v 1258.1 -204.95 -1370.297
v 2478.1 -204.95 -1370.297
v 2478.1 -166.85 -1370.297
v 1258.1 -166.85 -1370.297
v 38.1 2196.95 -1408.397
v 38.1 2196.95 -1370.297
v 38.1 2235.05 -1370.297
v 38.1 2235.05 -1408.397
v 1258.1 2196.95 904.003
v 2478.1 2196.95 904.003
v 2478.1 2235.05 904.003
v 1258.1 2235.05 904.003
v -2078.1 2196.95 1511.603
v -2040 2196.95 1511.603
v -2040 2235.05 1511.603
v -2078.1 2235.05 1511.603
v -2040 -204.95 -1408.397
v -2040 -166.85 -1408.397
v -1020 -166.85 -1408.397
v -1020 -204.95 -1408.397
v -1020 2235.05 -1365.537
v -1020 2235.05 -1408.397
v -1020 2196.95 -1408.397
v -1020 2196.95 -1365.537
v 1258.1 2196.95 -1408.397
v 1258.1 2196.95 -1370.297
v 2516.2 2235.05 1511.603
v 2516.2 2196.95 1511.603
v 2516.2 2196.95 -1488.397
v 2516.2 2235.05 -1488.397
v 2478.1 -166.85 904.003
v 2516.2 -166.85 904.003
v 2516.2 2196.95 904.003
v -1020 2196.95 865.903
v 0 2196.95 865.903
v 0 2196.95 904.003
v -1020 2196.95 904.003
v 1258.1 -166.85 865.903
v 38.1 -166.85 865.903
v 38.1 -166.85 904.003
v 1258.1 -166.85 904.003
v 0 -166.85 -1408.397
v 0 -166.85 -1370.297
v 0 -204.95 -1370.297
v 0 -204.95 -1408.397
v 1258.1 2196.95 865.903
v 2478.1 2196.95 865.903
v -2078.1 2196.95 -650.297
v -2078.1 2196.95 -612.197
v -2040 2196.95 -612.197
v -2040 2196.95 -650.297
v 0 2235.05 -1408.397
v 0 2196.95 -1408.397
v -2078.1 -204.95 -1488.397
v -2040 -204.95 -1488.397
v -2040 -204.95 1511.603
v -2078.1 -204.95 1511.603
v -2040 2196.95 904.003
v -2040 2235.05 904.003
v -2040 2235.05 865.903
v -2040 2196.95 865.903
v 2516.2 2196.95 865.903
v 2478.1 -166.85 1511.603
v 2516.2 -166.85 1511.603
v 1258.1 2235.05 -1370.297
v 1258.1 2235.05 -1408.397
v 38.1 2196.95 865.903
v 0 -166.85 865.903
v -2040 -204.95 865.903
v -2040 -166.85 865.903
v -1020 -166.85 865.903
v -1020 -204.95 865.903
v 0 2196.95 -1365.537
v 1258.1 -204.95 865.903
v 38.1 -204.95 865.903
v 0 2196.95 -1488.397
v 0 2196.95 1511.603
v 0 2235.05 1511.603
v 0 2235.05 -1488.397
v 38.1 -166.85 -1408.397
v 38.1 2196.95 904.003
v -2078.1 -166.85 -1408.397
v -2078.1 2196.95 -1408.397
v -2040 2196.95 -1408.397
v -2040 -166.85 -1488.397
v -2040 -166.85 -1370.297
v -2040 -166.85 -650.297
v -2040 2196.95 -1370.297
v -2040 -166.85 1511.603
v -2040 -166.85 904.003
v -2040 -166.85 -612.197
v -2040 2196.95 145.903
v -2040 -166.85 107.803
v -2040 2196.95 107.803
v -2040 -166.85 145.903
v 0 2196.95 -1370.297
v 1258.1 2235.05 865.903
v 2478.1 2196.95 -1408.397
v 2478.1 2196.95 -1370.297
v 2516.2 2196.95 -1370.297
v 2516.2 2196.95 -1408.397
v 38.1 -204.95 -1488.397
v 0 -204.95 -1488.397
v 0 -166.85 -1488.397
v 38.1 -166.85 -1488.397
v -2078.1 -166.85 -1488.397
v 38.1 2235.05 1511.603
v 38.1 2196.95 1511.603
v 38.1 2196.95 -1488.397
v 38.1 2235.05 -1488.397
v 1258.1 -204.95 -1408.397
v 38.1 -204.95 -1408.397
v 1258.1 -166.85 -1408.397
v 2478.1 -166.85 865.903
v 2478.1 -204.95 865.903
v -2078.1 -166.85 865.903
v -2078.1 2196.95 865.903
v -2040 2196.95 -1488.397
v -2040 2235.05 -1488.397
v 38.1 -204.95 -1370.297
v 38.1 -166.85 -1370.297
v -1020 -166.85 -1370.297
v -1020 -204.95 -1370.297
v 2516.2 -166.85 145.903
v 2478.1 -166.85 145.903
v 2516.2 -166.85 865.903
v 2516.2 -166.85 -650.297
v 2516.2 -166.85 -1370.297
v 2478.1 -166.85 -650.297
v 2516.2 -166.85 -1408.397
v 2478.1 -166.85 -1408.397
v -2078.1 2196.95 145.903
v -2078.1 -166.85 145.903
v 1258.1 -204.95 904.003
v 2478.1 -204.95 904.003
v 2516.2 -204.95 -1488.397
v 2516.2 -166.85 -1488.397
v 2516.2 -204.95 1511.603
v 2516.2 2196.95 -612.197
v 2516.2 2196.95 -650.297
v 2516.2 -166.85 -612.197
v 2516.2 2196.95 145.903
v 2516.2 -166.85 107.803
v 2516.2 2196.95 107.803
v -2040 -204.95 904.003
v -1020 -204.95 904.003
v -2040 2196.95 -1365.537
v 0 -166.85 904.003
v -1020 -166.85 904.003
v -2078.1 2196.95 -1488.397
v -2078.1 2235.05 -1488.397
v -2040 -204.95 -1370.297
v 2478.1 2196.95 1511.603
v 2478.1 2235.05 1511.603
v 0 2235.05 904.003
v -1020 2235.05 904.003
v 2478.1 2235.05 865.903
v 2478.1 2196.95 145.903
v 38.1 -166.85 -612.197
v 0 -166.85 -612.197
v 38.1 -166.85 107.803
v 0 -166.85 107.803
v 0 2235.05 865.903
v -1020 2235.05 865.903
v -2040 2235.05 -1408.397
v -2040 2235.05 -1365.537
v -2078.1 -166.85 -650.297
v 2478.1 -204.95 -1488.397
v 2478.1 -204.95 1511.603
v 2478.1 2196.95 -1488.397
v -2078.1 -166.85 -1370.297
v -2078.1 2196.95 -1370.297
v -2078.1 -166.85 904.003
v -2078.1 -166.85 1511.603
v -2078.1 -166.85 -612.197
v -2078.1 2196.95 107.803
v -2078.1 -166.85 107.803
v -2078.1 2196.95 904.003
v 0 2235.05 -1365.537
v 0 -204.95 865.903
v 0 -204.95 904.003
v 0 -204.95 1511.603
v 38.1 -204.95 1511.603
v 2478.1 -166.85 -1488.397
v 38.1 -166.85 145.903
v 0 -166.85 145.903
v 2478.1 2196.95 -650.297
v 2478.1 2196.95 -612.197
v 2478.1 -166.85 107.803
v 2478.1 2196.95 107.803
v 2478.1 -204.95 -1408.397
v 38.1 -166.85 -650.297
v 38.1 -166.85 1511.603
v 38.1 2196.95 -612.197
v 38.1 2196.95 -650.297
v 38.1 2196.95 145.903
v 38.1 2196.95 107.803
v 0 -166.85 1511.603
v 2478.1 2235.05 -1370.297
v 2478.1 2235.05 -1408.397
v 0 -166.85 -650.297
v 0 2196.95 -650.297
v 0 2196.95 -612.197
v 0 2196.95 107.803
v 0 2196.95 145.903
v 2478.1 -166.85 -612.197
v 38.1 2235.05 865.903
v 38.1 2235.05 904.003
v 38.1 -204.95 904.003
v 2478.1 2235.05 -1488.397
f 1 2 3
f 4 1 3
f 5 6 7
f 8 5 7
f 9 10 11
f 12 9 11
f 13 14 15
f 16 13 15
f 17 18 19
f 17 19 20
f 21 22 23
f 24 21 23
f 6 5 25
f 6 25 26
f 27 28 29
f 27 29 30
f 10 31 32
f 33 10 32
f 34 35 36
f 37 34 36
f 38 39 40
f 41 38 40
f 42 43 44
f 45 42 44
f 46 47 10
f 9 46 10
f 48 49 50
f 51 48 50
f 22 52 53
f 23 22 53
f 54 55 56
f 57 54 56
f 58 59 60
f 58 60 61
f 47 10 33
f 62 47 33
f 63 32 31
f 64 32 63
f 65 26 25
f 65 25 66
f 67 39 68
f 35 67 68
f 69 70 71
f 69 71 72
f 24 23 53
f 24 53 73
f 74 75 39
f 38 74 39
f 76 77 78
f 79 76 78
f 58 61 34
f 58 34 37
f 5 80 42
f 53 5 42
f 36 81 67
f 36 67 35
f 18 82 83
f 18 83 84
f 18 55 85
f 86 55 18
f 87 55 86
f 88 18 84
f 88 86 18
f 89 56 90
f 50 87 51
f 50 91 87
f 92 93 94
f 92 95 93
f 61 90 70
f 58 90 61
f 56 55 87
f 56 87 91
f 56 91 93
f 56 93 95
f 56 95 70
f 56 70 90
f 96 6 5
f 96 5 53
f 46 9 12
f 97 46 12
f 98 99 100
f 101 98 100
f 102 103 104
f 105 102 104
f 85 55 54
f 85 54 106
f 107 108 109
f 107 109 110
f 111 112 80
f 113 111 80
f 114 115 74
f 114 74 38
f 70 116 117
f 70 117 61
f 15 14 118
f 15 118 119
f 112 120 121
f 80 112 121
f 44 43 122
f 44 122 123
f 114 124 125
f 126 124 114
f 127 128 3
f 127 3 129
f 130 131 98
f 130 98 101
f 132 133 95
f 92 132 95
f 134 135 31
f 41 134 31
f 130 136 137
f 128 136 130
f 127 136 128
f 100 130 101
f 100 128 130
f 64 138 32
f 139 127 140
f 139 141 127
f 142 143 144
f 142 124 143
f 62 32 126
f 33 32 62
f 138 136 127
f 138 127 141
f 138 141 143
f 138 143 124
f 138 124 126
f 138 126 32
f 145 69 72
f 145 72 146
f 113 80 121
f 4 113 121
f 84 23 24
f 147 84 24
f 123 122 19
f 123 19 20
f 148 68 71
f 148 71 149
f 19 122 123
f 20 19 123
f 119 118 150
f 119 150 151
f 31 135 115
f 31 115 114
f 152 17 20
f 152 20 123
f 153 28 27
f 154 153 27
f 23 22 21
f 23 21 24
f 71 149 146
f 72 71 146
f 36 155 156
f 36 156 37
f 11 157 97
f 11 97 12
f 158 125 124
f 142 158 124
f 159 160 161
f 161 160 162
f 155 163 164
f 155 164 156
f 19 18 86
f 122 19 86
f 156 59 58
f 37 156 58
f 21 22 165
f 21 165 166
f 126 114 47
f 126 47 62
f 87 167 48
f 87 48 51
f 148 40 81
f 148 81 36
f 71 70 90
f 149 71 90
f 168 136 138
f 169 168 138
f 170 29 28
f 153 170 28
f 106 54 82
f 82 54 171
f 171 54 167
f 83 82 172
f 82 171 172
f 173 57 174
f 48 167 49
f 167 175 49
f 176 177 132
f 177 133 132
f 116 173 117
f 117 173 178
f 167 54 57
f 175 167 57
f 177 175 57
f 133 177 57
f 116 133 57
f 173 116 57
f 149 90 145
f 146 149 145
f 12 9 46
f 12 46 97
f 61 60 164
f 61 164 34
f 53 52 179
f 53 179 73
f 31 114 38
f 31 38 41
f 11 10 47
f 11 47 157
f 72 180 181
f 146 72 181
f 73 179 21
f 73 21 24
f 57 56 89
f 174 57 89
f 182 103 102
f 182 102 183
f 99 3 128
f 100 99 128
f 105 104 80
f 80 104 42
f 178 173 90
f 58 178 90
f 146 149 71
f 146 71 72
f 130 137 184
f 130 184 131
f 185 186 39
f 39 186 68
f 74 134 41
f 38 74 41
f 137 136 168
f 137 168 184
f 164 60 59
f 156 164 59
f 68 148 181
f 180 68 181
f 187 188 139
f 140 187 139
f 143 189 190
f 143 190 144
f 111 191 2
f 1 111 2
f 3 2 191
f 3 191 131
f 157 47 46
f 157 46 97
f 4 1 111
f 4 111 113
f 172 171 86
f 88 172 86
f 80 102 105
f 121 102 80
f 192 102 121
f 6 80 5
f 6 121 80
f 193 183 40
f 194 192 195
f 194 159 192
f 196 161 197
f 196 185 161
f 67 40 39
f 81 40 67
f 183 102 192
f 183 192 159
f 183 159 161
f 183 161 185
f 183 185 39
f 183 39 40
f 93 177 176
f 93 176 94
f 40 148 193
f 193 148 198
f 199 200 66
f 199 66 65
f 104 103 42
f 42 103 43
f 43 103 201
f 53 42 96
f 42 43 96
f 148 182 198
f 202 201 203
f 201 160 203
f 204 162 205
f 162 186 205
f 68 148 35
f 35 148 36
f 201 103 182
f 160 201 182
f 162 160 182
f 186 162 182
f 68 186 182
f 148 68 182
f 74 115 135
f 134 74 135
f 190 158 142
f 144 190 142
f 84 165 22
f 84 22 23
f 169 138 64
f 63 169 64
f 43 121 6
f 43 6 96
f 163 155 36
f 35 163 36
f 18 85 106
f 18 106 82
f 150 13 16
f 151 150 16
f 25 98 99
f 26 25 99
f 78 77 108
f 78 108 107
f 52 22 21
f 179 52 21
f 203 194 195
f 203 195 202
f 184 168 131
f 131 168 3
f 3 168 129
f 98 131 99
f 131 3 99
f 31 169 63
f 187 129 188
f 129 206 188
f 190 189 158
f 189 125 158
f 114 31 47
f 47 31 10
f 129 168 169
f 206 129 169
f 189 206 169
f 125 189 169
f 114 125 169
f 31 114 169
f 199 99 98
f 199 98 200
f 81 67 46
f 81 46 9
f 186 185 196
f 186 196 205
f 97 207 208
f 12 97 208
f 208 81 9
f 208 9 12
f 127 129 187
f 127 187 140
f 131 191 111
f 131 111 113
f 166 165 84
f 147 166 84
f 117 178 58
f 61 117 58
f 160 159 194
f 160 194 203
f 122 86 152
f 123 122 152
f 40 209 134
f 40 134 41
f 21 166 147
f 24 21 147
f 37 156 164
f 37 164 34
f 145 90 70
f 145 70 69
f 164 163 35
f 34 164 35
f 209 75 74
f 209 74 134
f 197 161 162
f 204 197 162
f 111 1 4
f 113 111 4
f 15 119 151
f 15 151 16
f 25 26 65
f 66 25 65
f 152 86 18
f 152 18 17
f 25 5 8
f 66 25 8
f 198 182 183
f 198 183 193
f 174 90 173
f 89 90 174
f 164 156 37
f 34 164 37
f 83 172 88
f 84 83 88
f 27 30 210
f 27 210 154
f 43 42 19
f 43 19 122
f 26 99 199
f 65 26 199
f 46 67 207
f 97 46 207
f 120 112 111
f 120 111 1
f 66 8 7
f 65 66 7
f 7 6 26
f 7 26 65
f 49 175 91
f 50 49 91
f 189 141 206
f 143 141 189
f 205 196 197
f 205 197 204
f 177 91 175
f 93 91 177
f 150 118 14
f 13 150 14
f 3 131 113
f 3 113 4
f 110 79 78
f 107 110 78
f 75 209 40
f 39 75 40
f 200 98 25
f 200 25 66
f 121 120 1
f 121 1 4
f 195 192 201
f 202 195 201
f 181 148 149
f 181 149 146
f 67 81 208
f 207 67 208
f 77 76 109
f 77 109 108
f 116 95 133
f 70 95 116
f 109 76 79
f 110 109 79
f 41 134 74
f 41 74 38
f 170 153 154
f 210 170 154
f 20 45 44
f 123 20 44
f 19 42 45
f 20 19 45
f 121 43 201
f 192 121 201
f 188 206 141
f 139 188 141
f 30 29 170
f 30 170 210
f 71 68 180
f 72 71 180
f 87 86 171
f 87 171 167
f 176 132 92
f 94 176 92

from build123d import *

# Parameters (mm, degrees)
F0_W      = 38.1
F0_H      = 3000
F1_DEPTH  = 38.1
F2_W      = 38.1
F2_H      = 38.1
F3_DEPTH  = 2363.8
F4_W      = 38.1
F4_H      = 38.1
F5_DEPTH  = 2363.8
F6_W      = 38.1
F6_H      = 38.1
F7_DEPTH  = 2363.8
F8_W      = 38.1
F8_H      = 38.1
F9_DEPTH  = 1020
F8_H_2    = 42.8596847504
F11_W     = 38.1
F11_H     = 38.1
F12_DEPTH = 1220


with BuildPart() as f1:
    # F0 (on Right) → F1 (new body)
    with BuildSketch(Plane.YZ):
        with Locations((-185.9003488964, 11.6033870727)):
            Rectangle(F0_W, F0_H)
    extrude(amount=F1_DEPTH)

    # F2 (on face) → F3 (join)
    with BuildSketch(Plane(origin=(0, -166.8503488964, 0), x_dir=(-1, 0, 0), z_dir=(0, 1, 0))):
        with Locations((-19.05, -1389.3466129273)):
            Rectangle(F2_W, F2_H)
    extrude(amount=F3_DEPTH)

    # F4 (on face) → F5 (join)
    with BuildSketch(Plane(origin=(0, -166.8503488964, 0), x_dir=(-1, 0, 0), z_dir=(0, 1, 0))):
        with Locations((-19.05, -631.2466129273)):
            Rectangle(F4_W, F4_H)
    extrude(amount=F5_DEPTH)

    # F6 (on face) → F7 (join)
    with BuildSketch(Plane(origin=(0, -166.8503488964, 0), x_dir=(-1, 0, 0), z_dir=(0, 1, 0))):
        with Locations((-19.05, 126.8533870727)):
            Rectangle(F6_W, F6_H)
        with Locations((-19.05, 884.9533870727)):
            Rectangle(F6_W, F6_H)
    extrude(amount=F7_DEPTH)


with BuildPart() as f1b:
    # F0 (on Right) → F1, piece 2 (new body)
    with BuildSketch(Plane.YZ):
        with Locations((2215.9996511036, 11.6033870727)):
            Rectangle(F0_W, F0_H)
    extrude(amount=F1_DEPTH)


with BuildPart() as f9:
    # F8 (on face) → F9 (new body)
    with BuildSketch(Plane(origin=(0, 0, 0), x_dir=(0, -1, 0), z_dir=(-1, 0, 0))):
        with Locations((185.9003488964, 884.9533870727)):
            Rectangle(F8_W, F8_H)
    extrude(amount=F9_DEPTH)


with BuildPart() as f9b:
    # F8 (on face) → F9, piece 2 (new body)
    with BuildSketch(Plane(origin=(0, 0, 0), x_dir=(0, -1, 0), z_dir=(-1, 0, 0))):
        with Locations((-2215.9996511036, 884.9533870727)):
            Rectangle(F8_W, F8_H)
    extrude(amount=F9_DEPTH)


with BuildPart() as f9c:
    # F8 (on face) → F9, piece 3 (new body)
    with BuildSketch(Plane(origin=(0, 0, 0), x_dir=(0, -1, 0), z_dir=(-1, 0, 0))):
        with Locations((-2215.9996511036, -1386.9667705521)):
            Rectangle(F8_W, F8_H_2)
    extrude(amount=F9_DEPTH)


with BuildPart() as f9d:
    # F8 (on face) → F9, piece 4 (new body)
    with BuildSketch(Plane(origin=(0, 0, 0), x_dir=(0, -1, 0), z_dir=(-1, 0, 0))):
        with Locations((185.9003488964, -1389.3466129273)):
            Rectangle(F8_W, F8_H)
    extrude(amount=F9_DEPTH)


with BuildPart() as f10_1:
    # F10: instance of F1
    add(f1.part.mirror(Plane(origin=(-1020, 2215.9996511036, 884.9533870727), x_dir=(0, -1, 0), z_dir=(-1, 0, 0))))


with BuildPart() as f10_2:
    # F10: instance of F1b
    add(f1b.part.mirror(Plane(origin=(-1020, 2215.9996511036, 884.9533870727), x_dir=(0, -1, 0), z_dir=(-1, 0, 0))))


with BuildPart() as f10_3:
    # F10: instance of F9
    add(f9.part.mirror(Plane(origin=(-1020, 2215.9996511036, 884.9533870727), x_dir=(0, -1, 0), z_dir=(-1, 0, 0))))


with BuildPart() as f10_4:
    # F10: instance of F9b
    add(f9b.part.mirror(Plane(origin=(-1020, 2215.9996511036, 884.9533870727), x_dir=(0, -1, 0), z_dir=(-1, 0, 0))))


with BuildPart() as f10_5:
    # F10: instance of F9c
    add(f9c.part.mirror(Plane(origin=(-1020, 2215.9996511036, 884.9533870727), x_dir=(0, -1, 0), z_dir=(-1, 0, 0))))


with BuildPart() as f10_6:
    # F10: instance of F9d
    add(f9d.part.mirror(Plane(origin=(-1020, 2215.9996511036, 884.9533870727), x_dir=(0, -1, 0), z_dir=(-1, 0, 0))))


with BuildPart() as f12:
    # F11 (on face) → F12 (new body)
    with BuildSketch(Plane.YZ.offset(38.1)):
        with Locations((-185.9003488964, 884.9533870727)):
            Rectangle(F11_W, F11_H)
    extrude(amount=F12_DEPTH)


with BuildPart() as f12b:
    # F11 (on face) → F12, piece 2 (new body)
    with BuildSketch(Plane.YZ.offset(38.1)):
        with Locations((2215.9996511036, 884.9533870727)):
            Rectangle(F11_W, F11_H)
    extrude(amount=F12_DEPTH)


with BuildPart() as f12c:
    # F11 (on face) → F12, piece 3 (new body)
    with BuildSketch(Plane.YZ.offset(38.1)):
        with Locations((-185.9003488964, -1389.3466129273)):
            Rectangle(F11_W, F11_H)
    extrude(amount=F12_DEPTH)


with BuildPart() as f12d:
    # F11 (on face) → F12, piece 4 (new body)
    with BuildSketch(Plane.YZ.offset(38.1)):
        with Locations((2215.9996511036, -1389.3466129273)):
            Rectangle(F11_W, F11_H)
    extrude(amount=F12_DEPTH)


with BuildPart() as f13_1:
    # F13: instance of F1
    add(f1.part.mirror(Plane(origin=(1258.1, -185.9003488964, 884.9533870727), x_dir=(0, 1, 0), z_dir=(1, 0, 0))))


with BuildPart() as f13_2:
    # F13: instance of F1b
    add(f1b.part.mirror(Plane(origin=(1258.1, -185.9003488964, 884.9533870727), x_dir=(0, 1, 0), z_dir=(1, 0, 0))))


with BuildPart() as f13_3:
    # F13: instance of F12d
    add(f12d.part.mirror(Plane(origin=(1258.1, -185.9003488964, 884.9533870727), x_dir=(0, 1, 0), z_dir=(1, 0, 0))))


with BuildPart() as f13_4:
    # F13: instance of F12c
    add(f12c.part.mirror(Plane(origin=(1258.1, -185.9003488964, 884.9533870727), x_dir=(0, 1, 0), z_dir=(1, 0, 0))))


with BuildPart() as f13_5:
    # F13: instance of F12b
    add(f12b.part.mirror(Plane(origin=(1258.1, -185.9003488964, 884.9533870727), x_dir=(0, 1, 0), z_dir=(1, 0, 0))))


with BuildPart() as f13_6:
    # F13: instance of F12
    add(f12.part.mirror(Plane(origin=(1258.1, -185.9003488964, 884.9533870727), x_dir=(0, 1, 0), z_dir=(1, 0, 0))))


solid = Compound([f1.part, f1b.part, f9.part, f9b.part, f9c.part, f9d.part, f10_1.part, f10_2.part, f10_3.part, f10_4.part, f10_5.part, f10_6.part, f12.part, f12b.part, f12c.part, f12d.part, f13_1.part, f13_2.part, f13_3.part, f13_4.part, f13_5.part, f13_6.part])
